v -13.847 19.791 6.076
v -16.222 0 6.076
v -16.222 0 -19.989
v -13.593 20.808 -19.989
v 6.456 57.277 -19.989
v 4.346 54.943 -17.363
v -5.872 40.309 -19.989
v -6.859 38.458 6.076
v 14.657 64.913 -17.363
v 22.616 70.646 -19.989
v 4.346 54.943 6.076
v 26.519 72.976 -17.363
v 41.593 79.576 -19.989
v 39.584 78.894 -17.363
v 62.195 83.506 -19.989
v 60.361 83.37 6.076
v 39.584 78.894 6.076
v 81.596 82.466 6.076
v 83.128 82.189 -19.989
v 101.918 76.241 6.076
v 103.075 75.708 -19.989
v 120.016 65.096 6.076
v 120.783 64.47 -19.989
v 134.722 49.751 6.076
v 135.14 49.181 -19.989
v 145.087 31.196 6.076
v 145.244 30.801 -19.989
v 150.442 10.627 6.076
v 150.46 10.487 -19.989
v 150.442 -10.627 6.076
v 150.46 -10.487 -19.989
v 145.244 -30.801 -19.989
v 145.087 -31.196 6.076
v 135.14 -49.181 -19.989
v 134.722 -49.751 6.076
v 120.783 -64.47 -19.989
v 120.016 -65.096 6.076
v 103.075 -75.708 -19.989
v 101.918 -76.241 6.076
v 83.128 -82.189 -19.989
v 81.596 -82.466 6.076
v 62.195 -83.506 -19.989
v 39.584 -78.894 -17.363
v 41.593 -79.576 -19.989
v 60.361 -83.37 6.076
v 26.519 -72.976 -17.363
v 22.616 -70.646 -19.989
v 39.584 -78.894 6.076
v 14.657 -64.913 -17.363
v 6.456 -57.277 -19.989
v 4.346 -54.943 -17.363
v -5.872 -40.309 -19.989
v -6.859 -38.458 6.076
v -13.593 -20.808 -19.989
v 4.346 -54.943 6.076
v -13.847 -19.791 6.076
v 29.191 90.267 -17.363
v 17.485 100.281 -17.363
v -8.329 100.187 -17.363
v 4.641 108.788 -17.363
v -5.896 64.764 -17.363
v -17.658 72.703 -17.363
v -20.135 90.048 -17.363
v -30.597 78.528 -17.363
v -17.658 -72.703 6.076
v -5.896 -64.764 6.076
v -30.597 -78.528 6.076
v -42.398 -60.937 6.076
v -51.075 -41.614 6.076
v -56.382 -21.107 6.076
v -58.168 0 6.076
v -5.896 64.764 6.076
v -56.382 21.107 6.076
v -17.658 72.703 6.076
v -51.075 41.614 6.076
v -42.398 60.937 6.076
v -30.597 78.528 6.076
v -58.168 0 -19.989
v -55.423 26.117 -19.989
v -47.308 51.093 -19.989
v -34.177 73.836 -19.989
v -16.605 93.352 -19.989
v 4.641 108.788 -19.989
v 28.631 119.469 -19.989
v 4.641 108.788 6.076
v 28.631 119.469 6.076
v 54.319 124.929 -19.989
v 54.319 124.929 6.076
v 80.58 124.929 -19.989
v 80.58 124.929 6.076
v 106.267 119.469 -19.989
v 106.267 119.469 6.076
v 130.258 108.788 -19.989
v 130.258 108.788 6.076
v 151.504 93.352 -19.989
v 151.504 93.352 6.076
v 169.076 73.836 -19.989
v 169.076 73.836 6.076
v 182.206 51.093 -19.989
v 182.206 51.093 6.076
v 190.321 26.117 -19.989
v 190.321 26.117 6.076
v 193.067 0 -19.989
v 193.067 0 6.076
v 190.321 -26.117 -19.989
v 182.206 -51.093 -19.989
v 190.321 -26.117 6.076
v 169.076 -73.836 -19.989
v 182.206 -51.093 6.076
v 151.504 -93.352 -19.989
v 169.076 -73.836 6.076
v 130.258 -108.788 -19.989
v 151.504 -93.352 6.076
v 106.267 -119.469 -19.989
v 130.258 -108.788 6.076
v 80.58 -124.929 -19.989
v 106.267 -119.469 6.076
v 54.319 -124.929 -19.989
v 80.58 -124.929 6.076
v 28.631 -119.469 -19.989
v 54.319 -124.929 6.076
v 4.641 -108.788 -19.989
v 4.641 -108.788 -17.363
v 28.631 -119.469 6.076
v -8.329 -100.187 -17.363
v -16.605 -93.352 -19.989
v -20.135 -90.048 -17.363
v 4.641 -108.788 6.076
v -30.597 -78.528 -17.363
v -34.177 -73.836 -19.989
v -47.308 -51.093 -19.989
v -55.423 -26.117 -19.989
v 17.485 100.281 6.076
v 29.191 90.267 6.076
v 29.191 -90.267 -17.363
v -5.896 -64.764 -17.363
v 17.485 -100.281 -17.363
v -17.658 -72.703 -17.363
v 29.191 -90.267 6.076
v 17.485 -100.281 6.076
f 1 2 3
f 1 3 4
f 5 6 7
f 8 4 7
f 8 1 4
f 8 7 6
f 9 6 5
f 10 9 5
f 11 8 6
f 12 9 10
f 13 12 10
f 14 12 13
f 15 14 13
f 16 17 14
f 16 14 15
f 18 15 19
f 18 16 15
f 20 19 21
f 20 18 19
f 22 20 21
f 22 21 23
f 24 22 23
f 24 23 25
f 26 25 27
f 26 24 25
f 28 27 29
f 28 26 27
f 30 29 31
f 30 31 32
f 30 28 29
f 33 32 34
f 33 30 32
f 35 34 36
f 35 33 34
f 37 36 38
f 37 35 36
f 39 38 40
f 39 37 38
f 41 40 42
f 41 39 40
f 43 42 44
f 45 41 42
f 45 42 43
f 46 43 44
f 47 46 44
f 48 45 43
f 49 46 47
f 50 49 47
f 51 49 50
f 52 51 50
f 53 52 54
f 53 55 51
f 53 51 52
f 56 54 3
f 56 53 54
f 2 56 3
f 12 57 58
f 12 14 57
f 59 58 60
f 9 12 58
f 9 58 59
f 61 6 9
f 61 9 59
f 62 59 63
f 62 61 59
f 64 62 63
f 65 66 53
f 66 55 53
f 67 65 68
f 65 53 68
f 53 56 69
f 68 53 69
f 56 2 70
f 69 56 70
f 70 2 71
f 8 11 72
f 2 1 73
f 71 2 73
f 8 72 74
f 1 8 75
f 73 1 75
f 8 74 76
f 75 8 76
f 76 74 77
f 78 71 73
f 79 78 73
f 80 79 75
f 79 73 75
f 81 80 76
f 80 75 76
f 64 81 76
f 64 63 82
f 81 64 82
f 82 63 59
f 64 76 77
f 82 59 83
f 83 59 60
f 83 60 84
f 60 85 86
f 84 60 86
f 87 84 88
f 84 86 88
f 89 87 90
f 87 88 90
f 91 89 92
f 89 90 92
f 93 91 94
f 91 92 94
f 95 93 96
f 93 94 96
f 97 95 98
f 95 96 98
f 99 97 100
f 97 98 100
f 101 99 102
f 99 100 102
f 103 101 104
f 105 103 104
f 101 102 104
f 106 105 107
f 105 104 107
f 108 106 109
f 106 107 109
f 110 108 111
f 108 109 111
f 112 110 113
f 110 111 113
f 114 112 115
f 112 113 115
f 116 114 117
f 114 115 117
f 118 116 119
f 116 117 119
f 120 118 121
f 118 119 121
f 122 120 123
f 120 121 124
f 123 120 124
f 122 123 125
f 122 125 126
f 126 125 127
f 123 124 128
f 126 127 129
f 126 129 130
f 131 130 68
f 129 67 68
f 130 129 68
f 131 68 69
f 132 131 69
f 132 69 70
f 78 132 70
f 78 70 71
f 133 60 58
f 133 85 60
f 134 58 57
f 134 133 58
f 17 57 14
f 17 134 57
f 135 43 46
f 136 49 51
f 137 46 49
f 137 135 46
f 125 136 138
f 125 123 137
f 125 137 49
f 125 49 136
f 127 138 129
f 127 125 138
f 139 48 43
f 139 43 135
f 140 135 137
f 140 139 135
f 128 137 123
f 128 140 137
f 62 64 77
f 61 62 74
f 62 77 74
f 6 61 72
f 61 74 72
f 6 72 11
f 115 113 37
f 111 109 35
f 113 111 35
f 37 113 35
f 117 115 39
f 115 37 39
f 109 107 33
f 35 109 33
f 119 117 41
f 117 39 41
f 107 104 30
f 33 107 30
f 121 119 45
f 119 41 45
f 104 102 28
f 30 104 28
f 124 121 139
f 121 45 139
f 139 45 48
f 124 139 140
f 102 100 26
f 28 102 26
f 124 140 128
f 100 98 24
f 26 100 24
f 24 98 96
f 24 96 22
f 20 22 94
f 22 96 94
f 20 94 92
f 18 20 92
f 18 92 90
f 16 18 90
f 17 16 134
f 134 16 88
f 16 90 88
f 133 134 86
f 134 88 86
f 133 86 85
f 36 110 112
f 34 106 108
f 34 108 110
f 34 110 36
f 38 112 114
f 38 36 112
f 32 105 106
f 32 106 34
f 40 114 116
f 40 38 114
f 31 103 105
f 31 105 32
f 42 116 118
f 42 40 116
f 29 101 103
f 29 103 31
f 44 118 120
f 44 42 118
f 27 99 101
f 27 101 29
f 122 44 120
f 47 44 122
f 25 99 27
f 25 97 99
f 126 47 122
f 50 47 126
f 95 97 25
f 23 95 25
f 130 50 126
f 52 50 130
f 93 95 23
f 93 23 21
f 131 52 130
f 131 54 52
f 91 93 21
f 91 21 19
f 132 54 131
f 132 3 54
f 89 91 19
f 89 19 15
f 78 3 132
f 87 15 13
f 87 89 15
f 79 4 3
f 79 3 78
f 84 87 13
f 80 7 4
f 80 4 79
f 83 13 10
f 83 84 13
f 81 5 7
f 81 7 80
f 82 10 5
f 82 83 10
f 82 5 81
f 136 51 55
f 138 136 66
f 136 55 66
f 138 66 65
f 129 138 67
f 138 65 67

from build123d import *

# Parameters (mm, degrees)
F0_W   = 41.94641
F0_H   = 26.064575
F0_W_2 = 42.390289
F0_H_2 = 29.70939


with BuildPart() as f1:
    # F0 (on Front) → F1 (revolve)
    with BuildSketch(Plane.XZ):
        with Locations((-37.19489, -6.956225)):
            Rectangle(F0_W, F0_H)
    revolve(axis=Axis((67.449205, 0, -2.508159), (0, 0, -1)))


with BuildPart() as f2:
    # F0 (on Front) → F2 (revolve)
    with BuildSketch(Plane.XZ):
        with Locations((46.25406, -2.508159)):
            Rectangle(F0_W_2, F0_H_2)
    revolve(axis=Axis((-58.168095, 0, -6.956225), (0, 0, -1)))


with BuildPart() as f1_1:
    add(f1.part)

    # F3: cut F2
    add(f2.part, mode=Mode.SUBTRACT)


solid = f1_1.part
